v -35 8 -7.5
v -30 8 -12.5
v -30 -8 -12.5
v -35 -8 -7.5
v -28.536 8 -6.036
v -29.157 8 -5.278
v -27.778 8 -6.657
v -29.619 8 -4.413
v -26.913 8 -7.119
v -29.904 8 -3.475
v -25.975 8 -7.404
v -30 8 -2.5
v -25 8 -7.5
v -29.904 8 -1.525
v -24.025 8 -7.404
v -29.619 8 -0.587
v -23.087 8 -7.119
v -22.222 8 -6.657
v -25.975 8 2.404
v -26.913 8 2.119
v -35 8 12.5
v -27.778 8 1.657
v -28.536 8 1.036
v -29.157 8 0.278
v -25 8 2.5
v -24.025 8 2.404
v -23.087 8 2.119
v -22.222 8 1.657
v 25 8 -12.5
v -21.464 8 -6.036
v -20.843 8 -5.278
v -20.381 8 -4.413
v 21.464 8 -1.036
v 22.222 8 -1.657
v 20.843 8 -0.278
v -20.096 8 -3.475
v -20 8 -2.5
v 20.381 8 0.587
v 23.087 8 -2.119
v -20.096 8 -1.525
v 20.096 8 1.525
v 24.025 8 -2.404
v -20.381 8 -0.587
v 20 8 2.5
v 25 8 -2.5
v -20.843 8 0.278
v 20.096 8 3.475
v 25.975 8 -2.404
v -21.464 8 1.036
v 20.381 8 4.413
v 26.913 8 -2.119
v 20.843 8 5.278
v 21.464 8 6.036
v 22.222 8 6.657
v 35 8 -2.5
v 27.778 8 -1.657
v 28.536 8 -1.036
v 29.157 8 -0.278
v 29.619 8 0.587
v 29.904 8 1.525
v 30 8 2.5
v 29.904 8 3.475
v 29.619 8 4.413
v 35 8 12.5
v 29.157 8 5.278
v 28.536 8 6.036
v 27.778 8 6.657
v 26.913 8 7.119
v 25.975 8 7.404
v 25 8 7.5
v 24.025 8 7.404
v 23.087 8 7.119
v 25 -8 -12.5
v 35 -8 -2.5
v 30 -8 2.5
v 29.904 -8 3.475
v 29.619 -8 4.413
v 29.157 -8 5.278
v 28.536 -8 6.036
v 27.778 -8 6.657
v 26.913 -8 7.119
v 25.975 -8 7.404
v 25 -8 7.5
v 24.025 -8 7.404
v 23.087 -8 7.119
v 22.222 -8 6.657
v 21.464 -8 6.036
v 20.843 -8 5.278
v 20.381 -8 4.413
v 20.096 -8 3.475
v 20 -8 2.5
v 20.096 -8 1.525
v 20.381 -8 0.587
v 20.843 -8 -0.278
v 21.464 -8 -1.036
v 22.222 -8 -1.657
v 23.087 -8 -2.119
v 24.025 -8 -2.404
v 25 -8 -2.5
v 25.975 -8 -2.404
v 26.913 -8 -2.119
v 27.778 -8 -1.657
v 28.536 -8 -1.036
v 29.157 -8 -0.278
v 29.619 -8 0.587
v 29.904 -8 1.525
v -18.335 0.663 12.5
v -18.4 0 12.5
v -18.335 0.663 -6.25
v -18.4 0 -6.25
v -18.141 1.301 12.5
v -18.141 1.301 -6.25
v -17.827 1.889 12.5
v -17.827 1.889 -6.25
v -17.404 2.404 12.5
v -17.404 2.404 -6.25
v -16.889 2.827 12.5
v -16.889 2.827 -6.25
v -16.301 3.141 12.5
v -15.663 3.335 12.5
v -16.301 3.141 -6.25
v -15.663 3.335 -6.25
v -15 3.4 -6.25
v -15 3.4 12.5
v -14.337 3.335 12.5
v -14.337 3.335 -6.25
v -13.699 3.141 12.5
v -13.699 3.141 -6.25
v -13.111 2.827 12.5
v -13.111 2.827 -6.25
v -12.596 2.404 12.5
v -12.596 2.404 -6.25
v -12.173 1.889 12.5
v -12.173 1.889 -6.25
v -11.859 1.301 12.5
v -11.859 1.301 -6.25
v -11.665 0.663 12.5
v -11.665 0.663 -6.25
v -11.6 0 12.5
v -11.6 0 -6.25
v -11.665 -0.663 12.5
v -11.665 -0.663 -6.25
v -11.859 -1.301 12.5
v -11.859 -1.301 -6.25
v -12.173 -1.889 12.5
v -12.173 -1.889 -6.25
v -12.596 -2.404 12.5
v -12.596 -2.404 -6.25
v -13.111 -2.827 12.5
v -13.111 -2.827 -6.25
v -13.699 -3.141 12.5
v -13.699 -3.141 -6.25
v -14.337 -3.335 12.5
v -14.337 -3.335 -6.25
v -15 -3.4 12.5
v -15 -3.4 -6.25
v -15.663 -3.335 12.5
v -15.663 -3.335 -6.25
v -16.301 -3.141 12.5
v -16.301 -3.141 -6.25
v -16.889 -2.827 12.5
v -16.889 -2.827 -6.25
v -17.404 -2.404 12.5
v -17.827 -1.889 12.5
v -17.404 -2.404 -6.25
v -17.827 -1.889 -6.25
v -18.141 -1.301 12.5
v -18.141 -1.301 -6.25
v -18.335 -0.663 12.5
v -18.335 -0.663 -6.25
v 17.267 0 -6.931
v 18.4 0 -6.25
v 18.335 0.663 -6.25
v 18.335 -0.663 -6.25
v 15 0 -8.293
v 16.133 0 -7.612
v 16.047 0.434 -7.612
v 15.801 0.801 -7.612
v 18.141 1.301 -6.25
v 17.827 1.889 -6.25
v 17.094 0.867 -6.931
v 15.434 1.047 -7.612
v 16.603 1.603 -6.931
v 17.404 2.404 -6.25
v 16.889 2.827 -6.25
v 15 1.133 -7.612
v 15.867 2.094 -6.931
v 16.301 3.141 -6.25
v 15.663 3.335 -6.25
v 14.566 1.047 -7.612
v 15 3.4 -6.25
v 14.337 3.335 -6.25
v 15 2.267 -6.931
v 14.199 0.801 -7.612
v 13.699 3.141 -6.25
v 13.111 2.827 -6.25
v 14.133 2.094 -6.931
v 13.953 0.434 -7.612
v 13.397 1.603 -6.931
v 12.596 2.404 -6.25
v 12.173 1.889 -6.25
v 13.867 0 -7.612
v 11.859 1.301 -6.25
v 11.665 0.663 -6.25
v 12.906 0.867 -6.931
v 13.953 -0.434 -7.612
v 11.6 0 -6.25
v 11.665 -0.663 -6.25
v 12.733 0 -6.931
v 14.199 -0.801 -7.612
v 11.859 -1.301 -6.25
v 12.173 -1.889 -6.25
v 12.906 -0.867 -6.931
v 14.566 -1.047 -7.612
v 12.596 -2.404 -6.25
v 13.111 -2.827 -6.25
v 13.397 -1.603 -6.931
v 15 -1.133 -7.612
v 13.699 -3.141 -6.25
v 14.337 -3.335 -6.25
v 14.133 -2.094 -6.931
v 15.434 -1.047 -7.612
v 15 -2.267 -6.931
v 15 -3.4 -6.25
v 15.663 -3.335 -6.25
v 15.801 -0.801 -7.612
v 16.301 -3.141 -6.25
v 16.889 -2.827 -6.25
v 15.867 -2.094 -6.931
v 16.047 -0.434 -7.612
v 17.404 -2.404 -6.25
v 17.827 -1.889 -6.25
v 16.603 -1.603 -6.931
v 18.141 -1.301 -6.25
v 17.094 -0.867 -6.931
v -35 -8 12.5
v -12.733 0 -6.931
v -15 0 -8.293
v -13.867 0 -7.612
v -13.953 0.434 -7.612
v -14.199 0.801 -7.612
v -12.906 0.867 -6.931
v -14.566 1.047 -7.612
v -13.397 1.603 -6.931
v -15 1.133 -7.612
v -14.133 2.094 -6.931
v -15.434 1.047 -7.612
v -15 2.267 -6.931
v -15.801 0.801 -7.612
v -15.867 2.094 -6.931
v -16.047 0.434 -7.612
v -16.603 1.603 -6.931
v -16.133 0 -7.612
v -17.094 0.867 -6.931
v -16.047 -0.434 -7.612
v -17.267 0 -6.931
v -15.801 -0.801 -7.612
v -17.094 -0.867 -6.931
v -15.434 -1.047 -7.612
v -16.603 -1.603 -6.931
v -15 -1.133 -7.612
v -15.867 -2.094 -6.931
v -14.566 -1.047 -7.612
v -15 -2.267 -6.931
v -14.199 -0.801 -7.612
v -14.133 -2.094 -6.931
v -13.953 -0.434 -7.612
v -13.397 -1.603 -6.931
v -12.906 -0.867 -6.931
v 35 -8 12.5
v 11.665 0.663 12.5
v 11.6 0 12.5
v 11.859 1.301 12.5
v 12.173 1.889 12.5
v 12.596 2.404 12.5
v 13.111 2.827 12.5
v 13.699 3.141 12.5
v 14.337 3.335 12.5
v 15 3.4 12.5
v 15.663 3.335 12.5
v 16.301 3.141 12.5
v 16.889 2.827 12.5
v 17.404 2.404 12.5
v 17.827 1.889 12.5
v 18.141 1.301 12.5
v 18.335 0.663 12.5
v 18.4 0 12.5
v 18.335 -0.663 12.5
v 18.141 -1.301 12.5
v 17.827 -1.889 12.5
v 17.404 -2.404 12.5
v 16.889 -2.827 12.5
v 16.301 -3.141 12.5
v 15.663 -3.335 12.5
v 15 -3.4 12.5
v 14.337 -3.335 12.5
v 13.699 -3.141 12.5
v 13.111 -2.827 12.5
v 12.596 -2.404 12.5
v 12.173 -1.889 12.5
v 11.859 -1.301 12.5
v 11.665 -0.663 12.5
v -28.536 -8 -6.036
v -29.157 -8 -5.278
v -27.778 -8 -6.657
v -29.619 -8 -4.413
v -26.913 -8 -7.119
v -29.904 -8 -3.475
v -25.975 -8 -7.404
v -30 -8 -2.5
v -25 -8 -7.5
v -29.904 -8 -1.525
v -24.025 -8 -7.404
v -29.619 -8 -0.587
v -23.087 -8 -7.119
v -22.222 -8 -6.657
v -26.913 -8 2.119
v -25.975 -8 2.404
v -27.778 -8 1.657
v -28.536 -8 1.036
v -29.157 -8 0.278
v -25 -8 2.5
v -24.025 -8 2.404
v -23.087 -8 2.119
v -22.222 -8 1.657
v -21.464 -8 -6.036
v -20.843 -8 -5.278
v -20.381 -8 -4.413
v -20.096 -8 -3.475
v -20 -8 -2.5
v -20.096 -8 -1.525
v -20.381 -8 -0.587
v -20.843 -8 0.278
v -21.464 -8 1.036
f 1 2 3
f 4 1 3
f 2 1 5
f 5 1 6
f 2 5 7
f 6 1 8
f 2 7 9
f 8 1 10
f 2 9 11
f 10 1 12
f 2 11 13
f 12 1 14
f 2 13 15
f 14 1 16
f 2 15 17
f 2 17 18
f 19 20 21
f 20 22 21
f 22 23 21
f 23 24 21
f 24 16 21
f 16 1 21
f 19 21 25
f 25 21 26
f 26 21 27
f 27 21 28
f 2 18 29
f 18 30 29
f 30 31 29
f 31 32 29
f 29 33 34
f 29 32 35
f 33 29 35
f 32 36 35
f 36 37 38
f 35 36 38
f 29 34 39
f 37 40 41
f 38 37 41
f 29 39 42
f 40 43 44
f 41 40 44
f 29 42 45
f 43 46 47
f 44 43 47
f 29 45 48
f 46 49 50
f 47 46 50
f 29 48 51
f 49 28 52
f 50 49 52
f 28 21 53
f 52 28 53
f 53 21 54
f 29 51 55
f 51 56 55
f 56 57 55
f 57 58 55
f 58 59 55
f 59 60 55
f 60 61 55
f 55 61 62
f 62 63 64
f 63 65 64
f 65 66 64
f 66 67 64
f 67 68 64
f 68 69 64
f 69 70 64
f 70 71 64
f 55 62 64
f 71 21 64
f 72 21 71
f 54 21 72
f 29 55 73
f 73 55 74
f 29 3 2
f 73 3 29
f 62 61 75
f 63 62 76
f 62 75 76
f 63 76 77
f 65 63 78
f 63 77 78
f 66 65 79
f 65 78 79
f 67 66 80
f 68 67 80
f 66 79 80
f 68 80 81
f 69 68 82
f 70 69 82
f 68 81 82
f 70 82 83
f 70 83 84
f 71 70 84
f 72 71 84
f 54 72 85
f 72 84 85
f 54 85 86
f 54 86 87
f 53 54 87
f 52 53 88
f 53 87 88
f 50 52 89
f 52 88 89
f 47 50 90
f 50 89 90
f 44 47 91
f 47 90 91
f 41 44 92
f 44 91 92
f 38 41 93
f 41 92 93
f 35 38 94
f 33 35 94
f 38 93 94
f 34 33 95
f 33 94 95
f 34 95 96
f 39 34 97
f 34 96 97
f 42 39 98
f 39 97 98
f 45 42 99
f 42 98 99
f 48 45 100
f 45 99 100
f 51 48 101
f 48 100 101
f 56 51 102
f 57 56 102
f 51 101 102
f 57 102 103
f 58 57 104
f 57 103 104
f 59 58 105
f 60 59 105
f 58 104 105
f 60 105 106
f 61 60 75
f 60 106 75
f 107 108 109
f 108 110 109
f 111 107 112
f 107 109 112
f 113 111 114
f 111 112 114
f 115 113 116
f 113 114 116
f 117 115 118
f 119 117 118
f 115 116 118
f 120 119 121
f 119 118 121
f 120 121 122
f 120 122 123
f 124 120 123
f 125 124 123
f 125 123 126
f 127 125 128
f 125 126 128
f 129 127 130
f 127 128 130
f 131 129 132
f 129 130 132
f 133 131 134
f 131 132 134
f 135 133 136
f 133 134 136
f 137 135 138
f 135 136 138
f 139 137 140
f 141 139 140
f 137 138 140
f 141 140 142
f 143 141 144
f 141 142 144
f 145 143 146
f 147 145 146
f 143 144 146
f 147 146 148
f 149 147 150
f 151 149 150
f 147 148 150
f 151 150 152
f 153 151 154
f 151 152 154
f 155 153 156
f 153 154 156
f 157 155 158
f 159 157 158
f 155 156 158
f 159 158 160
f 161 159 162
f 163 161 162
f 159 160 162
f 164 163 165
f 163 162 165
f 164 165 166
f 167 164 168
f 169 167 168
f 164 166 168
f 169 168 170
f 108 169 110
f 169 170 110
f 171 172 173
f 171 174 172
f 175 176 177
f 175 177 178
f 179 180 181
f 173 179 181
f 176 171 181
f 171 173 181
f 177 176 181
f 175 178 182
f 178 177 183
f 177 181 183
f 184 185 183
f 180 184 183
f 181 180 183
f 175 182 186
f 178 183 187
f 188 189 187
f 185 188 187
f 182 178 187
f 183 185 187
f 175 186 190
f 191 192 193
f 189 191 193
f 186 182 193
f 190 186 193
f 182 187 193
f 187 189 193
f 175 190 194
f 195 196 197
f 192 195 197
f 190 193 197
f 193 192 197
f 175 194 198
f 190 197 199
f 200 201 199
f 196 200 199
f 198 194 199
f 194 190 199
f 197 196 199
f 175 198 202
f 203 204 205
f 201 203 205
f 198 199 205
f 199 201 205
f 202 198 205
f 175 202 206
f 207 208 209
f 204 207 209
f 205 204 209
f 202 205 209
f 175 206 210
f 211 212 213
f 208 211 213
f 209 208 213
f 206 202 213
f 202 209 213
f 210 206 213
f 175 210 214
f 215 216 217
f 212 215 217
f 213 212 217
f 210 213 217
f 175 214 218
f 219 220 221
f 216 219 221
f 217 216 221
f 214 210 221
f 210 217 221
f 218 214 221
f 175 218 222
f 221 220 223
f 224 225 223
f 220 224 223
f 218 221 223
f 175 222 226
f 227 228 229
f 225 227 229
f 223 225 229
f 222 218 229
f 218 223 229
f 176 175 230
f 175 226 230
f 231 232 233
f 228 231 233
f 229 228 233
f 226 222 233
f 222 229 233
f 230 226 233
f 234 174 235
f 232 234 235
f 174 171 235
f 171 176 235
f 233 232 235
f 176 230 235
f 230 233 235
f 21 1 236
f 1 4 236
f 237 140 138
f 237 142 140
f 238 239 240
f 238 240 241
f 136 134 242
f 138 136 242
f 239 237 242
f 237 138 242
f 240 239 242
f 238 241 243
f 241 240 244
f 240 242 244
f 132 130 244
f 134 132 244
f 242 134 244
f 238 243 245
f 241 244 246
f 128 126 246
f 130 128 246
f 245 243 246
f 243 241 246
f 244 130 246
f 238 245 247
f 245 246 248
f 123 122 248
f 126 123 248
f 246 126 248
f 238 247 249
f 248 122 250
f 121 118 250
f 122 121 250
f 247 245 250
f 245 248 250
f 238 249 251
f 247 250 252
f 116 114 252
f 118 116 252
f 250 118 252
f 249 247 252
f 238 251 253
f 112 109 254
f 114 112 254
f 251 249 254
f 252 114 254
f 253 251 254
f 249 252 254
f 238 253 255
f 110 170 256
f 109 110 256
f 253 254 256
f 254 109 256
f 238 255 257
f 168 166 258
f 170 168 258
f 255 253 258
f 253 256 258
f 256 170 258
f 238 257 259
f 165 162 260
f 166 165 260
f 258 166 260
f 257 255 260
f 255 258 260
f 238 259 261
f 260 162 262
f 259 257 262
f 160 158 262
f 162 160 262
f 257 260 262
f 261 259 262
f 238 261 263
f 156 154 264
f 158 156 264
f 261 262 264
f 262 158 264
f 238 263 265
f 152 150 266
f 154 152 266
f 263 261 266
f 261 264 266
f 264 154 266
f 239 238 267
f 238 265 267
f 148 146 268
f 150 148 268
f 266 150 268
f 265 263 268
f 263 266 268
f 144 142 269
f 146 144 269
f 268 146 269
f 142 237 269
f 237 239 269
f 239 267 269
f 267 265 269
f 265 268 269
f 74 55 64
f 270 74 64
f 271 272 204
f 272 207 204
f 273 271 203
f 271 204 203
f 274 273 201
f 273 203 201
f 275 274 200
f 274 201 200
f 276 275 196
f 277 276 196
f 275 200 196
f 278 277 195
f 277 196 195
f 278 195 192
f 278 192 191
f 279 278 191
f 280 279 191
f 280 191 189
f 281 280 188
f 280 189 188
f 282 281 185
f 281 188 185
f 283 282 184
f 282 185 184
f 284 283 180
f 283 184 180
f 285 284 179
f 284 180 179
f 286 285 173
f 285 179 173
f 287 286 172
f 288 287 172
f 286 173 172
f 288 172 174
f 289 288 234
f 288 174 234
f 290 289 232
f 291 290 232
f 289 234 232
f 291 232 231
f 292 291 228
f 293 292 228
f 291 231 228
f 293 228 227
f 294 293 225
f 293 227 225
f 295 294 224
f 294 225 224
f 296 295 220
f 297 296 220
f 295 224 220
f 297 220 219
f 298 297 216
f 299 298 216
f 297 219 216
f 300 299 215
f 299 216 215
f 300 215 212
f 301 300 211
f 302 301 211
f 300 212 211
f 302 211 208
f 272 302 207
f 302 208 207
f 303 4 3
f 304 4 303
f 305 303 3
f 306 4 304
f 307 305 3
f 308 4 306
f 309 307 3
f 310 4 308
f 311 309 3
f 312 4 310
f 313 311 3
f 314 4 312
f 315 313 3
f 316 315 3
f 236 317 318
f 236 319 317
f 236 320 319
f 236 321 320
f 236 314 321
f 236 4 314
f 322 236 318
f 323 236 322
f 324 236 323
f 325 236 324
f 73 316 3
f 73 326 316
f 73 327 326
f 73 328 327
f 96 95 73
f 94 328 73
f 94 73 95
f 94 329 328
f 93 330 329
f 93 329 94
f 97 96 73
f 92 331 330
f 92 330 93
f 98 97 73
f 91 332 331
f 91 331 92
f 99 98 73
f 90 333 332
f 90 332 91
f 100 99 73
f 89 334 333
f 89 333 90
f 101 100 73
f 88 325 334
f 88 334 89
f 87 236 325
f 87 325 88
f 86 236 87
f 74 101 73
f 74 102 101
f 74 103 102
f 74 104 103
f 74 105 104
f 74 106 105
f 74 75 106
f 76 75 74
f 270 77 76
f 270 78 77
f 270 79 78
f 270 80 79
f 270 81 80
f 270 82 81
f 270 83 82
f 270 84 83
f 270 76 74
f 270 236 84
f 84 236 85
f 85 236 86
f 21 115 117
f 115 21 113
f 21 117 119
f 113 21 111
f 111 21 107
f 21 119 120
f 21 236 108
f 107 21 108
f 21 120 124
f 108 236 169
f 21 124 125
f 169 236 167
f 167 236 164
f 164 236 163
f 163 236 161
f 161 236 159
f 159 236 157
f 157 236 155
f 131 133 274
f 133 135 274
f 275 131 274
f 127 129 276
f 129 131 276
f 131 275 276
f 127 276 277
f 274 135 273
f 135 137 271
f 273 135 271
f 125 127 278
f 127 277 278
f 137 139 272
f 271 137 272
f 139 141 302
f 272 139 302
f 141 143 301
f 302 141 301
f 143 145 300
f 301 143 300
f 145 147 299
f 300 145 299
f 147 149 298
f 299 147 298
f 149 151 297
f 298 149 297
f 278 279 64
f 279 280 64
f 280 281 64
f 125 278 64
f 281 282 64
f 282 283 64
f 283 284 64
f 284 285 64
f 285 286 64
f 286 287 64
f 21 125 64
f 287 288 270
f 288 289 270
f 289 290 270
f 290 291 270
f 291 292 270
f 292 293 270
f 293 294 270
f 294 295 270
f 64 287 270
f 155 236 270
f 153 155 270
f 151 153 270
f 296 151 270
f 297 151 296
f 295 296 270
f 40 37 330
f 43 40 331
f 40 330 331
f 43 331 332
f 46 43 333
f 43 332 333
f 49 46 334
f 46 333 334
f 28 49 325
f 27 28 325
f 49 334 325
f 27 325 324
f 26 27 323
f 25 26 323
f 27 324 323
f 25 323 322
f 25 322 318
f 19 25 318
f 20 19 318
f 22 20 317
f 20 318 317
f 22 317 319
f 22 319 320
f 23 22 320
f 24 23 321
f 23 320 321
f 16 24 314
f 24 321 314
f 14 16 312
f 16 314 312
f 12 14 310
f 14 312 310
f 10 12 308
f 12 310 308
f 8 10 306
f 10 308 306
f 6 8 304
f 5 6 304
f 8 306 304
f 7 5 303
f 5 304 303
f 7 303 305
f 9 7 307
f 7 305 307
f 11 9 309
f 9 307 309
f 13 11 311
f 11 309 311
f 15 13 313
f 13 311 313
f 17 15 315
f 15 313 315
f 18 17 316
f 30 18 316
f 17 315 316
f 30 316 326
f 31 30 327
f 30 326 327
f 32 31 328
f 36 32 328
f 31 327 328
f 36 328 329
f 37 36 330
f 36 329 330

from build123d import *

# Parameters (mm, degrees)
F0_W     = 70
F0_H     = 25
F1_DEPTH = 8
F2_SIZE  = 5
F3_SIZE  = 10
F4_R     = 5
F5_DEPTH = 16
F7_D     = 6.8
F7_DEPTH = 18.75
F7_TIP   = 2.0429261047


with BuildPart() as f1:
    # F0 (on Front) → F1 (new body, symmetric)
    with BuildSketch(Plane.XZ):
        Rectangle(F0_W, F0_H)
    extrude(amount=F1_DEPTH, both=True)

    # F2
    f2_edges = [f1.edges().sort_by_distance(p)[0] for p in [
        (-35, 0, -12.5),
    ]]
    chamfer(f2_edges, length=F2_SIZE)

    # F3
    f3_edges = [f1.edges().sort_by_distance(p)[0] for p in [
        (35, 0, -12.5),
    ]]
    chamfer(f3_edges, length=F3_SIZE)

    # F4 (on face) → F5 (cut)
    with BuildSketch(Plane.XZ.offset(8)):
        with Locations((-25, -2.5)):
            Circle(F4_R)
        with Locations((25, 2.5)):
            Circle(F4_R)
    extrude(amount=-F5_DEPTH, mode=Mode.SUBTRACT)

    # F7
    with Locations(Plane.XY.offset(12.5)):
        with Locations((-15, 0), (15, 0)):
            Hole(F7_D / 2, depth=F7_DEPTH)
            with Locations((0, 0, -(F7_DEPTH + F7_TIP / 2))):  # 118° drill point
                Cone(0, F7_D / 2, F7_TIP, mode=Mode.SUBTRACT)


solid = f1.part
